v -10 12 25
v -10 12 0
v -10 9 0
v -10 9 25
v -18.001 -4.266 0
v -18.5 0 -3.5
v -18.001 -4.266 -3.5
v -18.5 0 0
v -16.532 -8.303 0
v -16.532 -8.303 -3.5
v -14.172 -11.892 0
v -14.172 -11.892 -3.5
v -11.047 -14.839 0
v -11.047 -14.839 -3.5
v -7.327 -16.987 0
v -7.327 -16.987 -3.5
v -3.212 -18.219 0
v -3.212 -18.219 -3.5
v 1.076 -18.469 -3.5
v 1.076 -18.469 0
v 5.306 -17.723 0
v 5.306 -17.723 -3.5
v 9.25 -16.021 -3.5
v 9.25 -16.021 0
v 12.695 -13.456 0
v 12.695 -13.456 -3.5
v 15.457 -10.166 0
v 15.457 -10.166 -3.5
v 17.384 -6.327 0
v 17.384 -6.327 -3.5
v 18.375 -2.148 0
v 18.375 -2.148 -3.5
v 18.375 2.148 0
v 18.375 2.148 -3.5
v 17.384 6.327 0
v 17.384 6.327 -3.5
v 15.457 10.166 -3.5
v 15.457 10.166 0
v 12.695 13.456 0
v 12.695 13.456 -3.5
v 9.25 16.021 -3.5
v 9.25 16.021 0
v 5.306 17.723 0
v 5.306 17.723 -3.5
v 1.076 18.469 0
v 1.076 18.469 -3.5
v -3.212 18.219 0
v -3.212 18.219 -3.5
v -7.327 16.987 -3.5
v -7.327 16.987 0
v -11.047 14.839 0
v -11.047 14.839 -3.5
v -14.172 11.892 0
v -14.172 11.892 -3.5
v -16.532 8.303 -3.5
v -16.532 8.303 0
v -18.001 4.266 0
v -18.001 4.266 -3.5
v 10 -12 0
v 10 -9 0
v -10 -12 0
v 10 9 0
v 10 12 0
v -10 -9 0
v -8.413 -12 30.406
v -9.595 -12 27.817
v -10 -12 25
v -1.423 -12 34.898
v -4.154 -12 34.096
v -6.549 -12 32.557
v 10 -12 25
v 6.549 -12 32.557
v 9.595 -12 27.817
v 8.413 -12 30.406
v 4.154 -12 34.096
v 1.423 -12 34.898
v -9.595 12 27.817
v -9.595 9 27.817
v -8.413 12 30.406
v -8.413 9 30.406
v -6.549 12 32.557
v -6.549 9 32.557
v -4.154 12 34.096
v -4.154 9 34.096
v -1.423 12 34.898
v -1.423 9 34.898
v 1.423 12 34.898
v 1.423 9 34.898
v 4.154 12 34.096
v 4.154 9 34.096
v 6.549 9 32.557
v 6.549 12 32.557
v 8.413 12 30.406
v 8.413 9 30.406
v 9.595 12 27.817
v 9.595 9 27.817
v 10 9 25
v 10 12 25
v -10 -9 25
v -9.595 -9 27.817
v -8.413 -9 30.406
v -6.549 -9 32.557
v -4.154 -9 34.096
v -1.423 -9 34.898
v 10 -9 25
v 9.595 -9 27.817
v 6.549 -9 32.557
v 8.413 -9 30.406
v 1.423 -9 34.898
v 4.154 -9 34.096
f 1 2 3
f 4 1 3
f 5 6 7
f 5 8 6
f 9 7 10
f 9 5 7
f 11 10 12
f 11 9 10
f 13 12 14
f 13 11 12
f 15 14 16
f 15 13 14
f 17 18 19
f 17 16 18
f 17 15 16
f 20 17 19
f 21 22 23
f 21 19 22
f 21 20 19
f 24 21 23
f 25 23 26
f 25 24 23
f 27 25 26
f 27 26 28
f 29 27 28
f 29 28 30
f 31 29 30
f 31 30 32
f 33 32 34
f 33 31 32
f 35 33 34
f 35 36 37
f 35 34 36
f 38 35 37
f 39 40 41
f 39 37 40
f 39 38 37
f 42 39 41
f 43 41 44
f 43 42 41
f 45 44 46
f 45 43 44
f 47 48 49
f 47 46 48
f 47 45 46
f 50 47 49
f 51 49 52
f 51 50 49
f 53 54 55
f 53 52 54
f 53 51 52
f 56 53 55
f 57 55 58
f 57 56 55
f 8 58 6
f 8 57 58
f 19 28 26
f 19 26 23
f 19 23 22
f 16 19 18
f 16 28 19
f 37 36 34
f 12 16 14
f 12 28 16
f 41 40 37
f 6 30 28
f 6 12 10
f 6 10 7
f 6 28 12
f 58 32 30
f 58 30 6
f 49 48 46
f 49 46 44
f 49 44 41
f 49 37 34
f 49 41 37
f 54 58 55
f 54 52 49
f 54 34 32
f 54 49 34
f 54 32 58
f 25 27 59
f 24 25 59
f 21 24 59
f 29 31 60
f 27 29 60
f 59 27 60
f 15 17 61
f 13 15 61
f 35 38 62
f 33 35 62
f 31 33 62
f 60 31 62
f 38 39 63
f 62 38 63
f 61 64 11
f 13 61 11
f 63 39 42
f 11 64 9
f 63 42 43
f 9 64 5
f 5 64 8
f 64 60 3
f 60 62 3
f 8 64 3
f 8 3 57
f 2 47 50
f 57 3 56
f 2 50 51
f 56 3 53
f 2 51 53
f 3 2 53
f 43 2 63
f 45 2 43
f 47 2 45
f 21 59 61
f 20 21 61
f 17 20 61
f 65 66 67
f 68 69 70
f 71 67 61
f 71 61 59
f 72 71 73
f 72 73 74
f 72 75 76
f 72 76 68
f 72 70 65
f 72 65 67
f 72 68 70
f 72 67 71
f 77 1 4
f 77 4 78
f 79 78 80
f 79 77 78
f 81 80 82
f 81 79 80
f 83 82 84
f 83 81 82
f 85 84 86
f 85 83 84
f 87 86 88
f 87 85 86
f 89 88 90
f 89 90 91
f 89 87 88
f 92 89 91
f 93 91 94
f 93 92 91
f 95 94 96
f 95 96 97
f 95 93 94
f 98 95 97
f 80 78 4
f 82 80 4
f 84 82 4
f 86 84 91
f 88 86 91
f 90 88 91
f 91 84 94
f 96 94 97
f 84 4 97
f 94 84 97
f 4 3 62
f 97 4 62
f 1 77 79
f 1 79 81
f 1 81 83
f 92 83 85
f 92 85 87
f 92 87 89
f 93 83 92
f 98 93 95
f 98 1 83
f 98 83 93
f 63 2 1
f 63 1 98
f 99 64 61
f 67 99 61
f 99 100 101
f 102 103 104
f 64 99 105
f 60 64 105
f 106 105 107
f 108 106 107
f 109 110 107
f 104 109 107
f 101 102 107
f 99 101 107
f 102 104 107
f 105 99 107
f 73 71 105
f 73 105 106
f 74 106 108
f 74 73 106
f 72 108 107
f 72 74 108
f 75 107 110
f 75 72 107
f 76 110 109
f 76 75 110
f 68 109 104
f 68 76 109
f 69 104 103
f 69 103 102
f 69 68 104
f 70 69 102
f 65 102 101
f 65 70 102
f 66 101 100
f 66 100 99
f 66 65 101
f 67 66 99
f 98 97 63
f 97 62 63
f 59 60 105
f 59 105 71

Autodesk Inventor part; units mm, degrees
ref_plane "YZ Plane" through (0, 0, 0) normal (1, 0, 0) x (0, 1, 0)
ref_plane "XZ Plane" through (0, 0, 0) normal (0, 1, 0) x (-1, 0, 0)
ref_plane "XY Plane" through (0, 0, 0) normal (0, 0, 1) x (1, 0, 0)
sketch "Sketch1 - walls" plane through (0, 0, 0) normal (0, 0, 1) x (1, 0, 0)
  line L0 (0, -9) -> (0, 9) construction
  line L1 (-10, -9) -> (-10, -12)
  line L2 (-10, -12) -> (10, -12)
  line L3 (-10, -9) -> (10, -9)
  line L4 (10, -9) -> (10, -12)
  line L5 (-10, 9) -> (10, 9)
  line L6 (10, 9) -> (10, 12)
  line L7 (10, 12) -> (-10, 12)
  line L8 (-10, 12) -> (-10, 9)
  point P0 (0, 0)
  dimension "d5" = 18
  dimension "d7" = 3
  dimension "d8" = 20
  dimension "d9" = 3
  dimension "d10" = 20
extrude "Extrusion1" add sketch "Sketch1 - walls" along normal blind 25
sketch "Sketch2 - base" plane through (0, 0, 0) normal (0, 0, -1) x (-1, 0, 0)
  circle A0 centre (0, 0) radius 18.5
  dimension "d13" = 37
sketch "Sketch3 - wall_top1" plane through (-10, 12, 25) normal (0, 1, 0) x (1, 0, 0)
  line L0 (10, 0) -> (10, -10) construction
  line L1 (20, 0) -> (0, 0) projected
  arc A0 (0, 0) -> (20, 0) centre (10, 0) ccw
  point P0 (10, 25)
  dimension "d16" = 10
extrude "Extrusion3" add sketch "Sketch3 - wall_top1" against normal blind 3
sketch "Sketch4 - wall_top2" plane through (-10, -12, 25) normal (0, -1, 0) x (1, 0, 0)
  line L0 (10, 0) -> (10, 10) construction
  line L1 (0, 0) -> (20, 0) projected
  arc A0 (20, 0) -> (0, 0) centre (10, 0) ccw
  dimension "d21" = 10
extrude "Extrusion4" add sketch "Sketch4 - wall_top2" against normal blind 3
extrude "Extrusion2" add sketch "Sketch2 - base" along normal blind 3.5
properties part number "swivel"
